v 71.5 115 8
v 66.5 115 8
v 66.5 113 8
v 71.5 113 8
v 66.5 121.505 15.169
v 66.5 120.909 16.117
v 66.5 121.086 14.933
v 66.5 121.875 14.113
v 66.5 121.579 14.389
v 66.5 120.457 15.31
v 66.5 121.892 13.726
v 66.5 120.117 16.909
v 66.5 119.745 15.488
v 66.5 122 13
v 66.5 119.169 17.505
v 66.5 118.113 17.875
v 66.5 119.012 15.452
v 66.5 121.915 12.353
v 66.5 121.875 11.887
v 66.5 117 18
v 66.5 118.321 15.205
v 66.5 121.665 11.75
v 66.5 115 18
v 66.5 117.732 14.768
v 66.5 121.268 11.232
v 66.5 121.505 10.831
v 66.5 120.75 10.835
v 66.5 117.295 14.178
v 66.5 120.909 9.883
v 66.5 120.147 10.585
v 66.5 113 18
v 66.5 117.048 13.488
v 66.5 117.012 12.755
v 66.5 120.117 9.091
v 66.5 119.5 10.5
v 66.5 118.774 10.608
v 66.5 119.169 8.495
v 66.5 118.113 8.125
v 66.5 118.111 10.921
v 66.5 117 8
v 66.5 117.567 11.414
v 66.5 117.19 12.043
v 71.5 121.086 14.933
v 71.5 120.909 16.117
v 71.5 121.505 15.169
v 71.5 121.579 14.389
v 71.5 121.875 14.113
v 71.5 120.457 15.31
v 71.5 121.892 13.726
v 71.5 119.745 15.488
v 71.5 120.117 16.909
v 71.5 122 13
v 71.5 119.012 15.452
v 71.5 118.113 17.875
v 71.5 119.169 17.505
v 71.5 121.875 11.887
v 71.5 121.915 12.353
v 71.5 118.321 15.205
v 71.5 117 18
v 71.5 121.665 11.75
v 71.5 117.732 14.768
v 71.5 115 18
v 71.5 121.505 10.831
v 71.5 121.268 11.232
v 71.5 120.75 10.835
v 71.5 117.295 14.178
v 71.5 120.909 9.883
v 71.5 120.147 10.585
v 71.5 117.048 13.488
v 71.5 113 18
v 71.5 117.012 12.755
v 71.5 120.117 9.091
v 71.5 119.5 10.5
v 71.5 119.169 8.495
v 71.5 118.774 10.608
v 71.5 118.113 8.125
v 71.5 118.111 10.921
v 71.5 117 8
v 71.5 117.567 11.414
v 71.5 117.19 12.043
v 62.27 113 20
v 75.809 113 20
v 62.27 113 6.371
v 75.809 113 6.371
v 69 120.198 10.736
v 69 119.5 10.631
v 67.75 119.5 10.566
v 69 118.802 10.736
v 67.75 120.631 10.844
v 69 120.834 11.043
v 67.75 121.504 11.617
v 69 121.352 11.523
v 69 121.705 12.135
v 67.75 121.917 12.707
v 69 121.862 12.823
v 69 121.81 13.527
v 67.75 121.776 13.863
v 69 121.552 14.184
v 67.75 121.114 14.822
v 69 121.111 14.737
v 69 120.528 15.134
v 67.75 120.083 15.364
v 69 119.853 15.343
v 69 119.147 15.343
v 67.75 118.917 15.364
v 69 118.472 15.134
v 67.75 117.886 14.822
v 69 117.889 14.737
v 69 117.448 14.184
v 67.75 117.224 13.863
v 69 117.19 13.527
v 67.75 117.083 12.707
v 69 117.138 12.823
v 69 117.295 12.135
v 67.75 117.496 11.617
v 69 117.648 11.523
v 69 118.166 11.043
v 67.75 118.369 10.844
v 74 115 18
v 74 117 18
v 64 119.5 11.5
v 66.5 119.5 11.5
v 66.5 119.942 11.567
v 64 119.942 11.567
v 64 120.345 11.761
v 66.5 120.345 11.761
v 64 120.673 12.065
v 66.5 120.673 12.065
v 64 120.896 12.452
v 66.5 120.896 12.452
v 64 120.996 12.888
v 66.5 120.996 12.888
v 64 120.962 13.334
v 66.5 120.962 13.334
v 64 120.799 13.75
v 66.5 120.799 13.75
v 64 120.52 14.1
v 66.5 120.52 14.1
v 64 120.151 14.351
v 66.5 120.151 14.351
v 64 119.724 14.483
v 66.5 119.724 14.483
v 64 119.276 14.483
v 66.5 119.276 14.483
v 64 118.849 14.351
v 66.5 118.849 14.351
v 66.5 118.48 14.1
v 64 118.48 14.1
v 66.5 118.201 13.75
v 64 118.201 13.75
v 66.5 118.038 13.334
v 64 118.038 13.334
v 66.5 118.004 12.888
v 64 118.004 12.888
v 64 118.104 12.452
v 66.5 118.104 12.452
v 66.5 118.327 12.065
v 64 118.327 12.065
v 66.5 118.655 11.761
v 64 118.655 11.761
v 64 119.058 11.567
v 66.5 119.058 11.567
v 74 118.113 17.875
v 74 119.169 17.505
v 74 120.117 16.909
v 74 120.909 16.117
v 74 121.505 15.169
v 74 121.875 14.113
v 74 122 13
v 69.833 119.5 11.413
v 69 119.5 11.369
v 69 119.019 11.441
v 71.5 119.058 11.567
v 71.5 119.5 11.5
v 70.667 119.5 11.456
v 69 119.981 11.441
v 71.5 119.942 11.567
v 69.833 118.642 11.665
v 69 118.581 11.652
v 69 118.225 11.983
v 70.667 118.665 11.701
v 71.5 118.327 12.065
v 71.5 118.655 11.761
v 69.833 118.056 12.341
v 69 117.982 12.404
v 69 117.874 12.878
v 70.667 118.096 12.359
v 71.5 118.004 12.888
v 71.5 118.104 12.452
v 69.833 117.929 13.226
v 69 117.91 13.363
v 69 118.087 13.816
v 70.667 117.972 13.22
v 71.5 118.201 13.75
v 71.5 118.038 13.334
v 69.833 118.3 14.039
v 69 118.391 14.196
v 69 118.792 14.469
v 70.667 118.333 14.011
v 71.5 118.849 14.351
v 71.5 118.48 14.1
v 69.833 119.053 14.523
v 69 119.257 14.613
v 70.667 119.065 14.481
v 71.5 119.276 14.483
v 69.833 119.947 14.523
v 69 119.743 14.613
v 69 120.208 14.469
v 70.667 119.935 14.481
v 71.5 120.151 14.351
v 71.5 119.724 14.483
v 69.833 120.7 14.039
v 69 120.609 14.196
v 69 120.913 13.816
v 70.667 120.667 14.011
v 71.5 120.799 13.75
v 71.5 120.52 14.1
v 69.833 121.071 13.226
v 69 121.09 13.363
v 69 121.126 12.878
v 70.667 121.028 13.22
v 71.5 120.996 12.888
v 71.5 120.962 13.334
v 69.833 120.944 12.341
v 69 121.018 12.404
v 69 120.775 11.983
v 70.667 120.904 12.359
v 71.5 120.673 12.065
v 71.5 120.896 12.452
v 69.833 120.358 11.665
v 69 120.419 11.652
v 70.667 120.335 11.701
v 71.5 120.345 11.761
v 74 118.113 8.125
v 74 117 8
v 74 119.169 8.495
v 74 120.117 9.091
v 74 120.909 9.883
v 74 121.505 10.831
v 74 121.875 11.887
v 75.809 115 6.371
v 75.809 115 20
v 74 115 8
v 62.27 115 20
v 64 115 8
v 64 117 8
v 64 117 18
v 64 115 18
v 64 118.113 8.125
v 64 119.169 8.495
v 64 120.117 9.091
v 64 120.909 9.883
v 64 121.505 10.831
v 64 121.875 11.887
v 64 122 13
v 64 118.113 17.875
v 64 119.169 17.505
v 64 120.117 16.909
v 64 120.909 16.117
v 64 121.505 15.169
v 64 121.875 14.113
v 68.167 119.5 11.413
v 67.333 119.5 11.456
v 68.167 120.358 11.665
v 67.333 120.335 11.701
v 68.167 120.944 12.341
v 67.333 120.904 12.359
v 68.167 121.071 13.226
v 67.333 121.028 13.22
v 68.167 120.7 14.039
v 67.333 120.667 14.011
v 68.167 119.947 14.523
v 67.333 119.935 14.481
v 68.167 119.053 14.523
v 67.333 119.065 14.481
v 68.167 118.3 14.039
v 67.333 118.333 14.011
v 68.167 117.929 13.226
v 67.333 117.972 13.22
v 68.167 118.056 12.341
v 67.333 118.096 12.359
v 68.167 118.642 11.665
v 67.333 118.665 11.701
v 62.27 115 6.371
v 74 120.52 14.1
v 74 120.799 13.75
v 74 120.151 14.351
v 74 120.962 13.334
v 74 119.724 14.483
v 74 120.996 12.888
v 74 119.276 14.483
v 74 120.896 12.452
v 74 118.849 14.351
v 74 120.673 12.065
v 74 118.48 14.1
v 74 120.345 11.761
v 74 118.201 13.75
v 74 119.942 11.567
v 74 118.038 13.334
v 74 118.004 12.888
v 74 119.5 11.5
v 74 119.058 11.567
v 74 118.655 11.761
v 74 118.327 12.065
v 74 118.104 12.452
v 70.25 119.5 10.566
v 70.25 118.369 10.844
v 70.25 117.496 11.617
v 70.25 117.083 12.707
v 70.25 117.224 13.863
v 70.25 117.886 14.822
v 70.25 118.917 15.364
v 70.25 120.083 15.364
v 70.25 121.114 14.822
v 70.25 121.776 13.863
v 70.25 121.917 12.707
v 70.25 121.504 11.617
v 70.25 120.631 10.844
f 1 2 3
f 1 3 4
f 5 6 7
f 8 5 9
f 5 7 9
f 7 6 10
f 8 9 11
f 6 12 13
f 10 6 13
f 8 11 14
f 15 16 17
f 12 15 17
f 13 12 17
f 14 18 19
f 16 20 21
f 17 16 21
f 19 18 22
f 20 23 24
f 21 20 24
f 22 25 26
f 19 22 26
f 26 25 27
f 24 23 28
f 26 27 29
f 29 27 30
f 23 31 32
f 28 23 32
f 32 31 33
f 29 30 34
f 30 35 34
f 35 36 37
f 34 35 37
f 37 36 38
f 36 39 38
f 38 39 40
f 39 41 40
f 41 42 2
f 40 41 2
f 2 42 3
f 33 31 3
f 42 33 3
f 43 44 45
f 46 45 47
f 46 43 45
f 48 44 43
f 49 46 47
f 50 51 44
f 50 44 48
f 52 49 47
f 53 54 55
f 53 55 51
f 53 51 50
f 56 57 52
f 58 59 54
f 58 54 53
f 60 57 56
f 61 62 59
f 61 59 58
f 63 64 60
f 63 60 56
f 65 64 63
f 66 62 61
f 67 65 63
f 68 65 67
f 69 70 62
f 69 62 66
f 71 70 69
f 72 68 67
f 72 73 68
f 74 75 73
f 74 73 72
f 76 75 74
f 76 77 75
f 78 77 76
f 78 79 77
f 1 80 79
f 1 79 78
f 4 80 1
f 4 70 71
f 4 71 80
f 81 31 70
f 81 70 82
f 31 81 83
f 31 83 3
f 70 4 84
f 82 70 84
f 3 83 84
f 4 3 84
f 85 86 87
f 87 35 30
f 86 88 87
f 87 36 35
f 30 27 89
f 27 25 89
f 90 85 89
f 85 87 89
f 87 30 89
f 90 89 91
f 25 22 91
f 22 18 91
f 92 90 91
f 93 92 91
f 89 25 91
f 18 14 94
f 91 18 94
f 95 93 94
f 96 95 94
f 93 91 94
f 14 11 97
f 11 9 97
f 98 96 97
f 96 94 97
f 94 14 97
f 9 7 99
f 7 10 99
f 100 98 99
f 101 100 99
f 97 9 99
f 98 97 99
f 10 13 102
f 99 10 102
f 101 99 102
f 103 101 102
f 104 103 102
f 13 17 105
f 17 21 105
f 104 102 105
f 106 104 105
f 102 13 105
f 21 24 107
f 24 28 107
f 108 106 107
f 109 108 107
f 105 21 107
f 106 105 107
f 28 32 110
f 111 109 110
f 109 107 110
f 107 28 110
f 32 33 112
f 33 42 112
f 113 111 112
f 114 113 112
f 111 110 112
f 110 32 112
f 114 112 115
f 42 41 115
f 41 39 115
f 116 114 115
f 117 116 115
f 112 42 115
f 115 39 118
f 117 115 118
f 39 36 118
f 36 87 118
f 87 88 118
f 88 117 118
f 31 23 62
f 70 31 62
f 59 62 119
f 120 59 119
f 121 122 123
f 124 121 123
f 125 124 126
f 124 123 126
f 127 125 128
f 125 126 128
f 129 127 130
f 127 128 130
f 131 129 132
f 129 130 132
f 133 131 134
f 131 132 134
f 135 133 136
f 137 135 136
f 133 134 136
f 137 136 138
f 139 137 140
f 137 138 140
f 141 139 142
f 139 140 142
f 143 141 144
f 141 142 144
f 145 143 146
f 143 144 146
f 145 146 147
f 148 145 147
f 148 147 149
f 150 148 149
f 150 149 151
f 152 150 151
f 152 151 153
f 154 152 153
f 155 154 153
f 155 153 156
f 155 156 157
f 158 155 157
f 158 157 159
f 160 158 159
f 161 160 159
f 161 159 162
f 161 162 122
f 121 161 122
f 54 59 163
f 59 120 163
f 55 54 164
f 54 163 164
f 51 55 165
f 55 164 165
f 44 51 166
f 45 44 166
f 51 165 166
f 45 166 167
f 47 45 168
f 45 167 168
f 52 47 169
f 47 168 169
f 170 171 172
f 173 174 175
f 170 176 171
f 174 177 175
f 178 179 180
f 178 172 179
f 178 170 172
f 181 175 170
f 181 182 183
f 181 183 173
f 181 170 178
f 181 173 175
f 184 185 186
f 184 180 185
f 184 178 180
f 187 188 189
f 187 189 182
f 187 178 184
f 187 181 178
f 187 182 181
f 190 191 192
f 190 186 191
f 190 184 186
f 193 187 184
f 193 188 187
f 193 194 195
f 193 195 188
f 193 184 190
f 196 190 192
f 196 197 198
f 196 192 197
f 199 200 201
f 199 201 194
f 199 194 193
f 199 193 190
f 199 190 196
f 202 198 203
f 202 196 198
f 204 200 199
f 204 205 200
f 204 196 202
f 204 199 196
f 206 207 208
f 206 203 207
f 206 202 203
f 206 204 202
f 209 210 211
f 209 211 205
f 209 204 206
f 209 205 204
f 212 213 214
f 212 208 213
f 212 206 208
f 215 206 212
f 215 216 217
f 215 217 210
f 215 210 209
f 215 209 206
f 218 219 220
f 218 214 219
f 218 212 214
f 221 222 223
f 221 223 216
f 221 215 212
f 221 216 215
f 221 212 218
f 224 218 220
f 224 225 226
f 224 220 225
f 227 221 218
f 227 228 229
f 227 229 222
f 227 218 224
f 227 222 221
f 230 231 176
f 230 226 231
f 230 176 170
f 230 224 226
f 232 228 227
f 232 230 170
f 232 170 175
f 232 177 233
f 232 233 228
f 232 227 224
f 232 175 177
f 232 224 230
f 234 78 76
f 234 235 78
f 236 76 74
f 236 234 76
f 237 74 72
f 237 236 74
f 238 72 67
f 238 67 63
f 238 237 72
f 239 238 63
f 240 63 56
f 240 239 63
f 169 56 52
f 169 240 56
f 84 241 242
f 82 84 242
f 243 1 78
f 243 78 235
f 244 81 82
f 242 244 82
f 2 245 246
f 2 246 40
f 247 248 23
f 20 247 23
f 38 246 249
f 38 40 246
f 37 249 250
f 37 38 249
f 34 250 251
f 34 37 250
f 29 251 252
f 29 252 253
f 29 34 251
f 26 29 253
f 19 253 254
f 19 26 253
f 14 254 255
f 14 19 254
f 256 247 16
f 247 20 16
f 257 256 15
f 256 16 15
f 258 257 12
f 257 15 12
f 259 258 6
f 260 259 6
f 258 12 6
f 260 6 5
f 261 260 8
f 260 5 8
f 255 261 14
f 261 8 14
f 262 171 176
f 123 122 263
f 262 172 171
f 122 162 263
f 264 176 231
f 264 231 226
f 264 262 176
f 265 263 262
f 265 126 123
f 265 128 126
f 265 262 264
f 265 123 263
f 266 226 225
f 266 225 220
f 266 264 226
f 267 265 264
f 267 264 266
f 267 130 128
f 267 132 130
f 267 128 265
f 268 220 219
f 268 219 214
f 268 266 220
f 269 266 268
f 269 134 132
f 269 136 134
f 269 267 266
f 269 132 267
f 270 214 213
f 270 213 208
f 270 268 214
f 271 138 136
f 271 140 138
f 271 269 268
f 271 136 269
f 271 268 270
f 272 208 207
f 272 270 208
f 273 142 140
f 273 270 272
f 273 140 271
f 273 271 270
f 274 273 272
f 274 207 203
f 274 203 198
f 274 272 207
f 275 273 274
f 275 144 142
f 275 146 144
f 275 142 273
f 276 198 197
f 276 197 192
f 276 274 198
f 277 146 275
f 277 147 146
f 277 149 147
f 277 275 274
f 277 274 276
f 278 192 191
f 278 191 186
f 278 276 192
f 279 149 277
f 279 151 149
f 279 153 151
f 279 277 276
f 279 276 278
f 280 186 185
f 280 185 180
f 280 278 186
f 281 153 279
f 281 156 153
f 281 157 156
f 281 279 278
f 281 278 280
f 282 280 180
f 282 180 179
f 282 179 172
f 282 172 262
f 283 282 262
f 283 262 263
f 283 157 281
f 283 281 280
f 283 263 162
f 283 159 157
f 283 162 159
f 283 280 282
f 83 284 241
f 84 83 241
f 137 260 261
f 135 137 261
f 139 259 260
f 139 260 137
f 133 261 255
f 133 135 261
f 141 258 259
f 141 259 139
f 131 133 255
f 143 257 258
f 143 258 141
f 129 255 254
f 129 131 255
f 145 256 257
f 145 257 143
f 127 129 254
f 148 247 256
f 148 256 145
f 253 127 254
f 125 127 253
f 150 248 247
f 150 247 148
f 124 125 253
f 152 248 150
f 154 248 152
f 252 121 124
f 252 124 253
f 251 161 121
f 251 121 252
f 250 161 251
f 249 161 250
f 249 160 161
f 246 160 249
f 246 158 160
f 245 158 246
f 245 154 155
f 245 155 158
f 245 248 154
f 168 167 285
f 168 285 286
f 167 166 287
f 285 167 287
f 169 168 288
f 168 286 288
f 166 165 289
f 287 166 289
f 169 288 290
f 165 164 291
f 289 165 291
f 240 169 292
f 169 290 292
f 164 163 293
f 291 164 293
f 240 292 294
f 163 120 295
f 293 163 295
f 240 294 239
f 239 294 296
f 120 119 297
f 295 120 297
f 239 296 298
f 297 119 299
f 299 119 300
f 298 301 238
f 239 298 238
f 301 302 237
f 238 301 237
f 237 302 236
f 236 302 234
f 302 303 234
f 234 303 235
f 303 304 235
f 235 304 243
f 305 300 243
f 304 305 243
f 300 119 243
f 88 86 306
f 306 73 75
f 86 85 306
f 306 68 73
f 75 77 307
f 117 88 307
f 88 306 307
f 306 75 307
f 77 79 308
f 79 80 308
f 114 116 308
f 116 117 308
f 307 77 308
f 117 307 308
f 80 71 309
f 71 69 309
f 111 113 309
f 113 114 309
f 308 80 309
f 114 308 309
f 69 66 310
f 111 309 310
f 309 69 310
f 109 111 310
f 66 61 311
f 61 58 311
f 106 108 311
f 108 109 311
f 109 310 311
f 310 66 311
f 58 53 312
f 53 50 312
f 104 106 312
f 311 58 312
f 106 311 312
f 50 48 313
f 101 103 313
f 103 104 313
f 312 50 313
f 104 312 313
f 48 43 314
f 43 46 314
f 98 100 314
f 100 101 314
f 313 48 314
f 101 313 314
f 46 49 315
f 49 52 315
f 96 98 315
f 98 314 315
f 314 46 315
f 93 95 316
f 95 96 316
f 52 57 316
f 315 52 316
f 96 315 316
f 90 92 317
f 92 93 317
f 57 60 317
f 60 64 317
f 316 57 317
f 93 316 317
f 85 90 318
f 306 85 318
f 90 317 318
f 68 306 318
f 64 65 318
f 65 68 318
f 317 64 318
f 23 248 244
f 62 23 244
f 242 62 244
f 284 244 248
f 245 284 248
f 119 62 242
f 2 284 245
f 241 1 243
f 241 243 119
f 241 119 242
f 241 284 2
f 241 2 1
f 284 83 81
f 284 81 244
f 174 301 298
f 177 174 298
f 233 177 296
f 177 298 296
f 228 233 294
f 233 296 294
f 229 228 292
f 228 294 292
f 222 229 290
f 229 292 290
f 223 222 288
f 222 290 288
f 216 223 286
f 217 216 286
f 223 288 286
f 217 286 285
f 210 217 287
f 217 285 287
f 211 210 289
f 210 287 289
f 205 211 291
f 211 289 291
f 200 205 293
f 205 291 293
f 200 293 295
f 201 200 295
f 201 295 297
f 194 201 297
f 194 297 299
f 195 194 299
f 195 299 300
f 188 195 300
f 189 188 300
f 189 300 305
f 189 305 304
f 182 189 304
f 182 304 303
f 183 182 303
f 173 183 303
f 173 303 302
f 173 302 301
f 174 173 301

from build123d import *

# Parameters (mm, degrees)
BOSS_EXTRUDE1_DEPTH       = 20
SKETCH2_W                 = 20
SKETCH2_H                 = 30
CUT_EXTRUDE1_DEPTH        = 142.509716981
SHELL1_T                  = -2
SHELL1_THICKNESS_2_FACE_W = 20
SHELL1_THICKNESS_2_FACE_H = 18
SHELL1_THICKNESS_2_DEPTH  = 3
SHELL1_THICKNESS_3_FACE_W = 18
SHELL1_THICKNESS_3_FACE_H = 20
SHELL1_THICKNESS_3_DEPTH  = 3
SKETCH42_W                = 1.26968537
SKETCH42_H                = 30
BOSS_EXTRUDE16_DEPTH      = 15
SKETCH45_W                = 2
SKETCH45_H                = 30
BOSS_EXTRUDE17_DEPTH      = 15
CUT_EXTRUDE15_DEPTH       = 1
CUT_EXTRUDE15_DEPTH_BACK  = 51
SKETCH40_R                = 1.25
SKETCH41_W                = 8
SKETCH41_H                = 20
CUT_EXTRUDE16_DEPTH       = 10
SKETCH44_W                = 1
SKETCH44_H                = 5
CUT_EXTRUDE18_DEPTH       = 18
BOSS_EXTRUDE18_DEPTH      = 15
CUT_EXTRUDE19_DEPTH       = 44.5
CUT_EXTRUDE19_DEPTH_BACK  = 1
SKETCH47_R                = 1.1
SKETCH50_W                = 25
SKETCH50_H                = 2
BOSS_EXTRUDE19_DEPTH      = 15
SKETCH51_W                = 10.975395667
SKETCH51_H                = 2
BOSS_EXTRUDE20_DEPTH      = 15
BOSS_EXTRUDE21_DEPTH      = 5
CUT_EXTRUDE21_DEPTH       = 33.5
CUT_EXTRUDE21_DEPTH_BACK  = 1
SKETCH53_R                = 1.1
CUT_EXTRUDE14_REACH       = 107
SKETCH34_R                = 2.5
SKETCH3_W                 = 2.5
SKETCH3_H                 = 10
BOSS_EXTRUDE2_DEPTH       = 7
FILLET2_R                 = 5
CUT_EXTRUDE3_REACH        = 151.466
SKETCH6_R                 = 1.5
SKETCH21_R                = 2.5
SKETCH21_R_2              = 1.5
BOSS_EXTRUDE10_DEPTH      = 2.5
BOSS_EXTRUDE10_DRAFT      = 3
MIRROR7_COPY_1_SKETCH_R   = 2.5
MIRROR7_COPY_1_SKETCH_R_2 = 1.5
MIRROR7_COPY_1_DEPTH      = 2.5
MIRROR7_COPY_1_DRAFT      = 3
SKETCH26_W                = 5
SKETCH26_H                = 10
CUT_EXTRUDE8_DEPTH        = 2
SKETCH7_W                 = 2.5
SKETCH7_H                 = 10
BOSS_EXTRUDE4_DEPTH       = 5
FILLET4_R                 = 5
SKETCH22_R                = 2.5
BOSS_EXTRUDE11_DEPTH      = 2.5
BOSS_EXTRUDE11_TAPER      = 3
SKETCH23_R                = 1.5
CUT_EXTRUDE7_DEPTH        = 10
CUT_EXTRUDE9_REACH        = 143.51
SKETCH27_W                = 5
SKETCH27_H                = 10
SKETCH10_W                = 2.5
SKETCH10_H                = 10
BOSS_EXTRUDE6_DEPTH       = 5
FILLET6_R                 = 5
SKETCH28_R                = 2.5
BOSS_EXTRUDE12_DEPTH      = 2.5
BOSS_EXTRUDE12_TAPER      = 3
SKETCH29_R                = 1.5
CUT_EXTRUDE10_DEPTH       = 10
CUT_EXTRUDE11_REACH       = 139.477
SKETCH30_W                = 5
SKETCH30_H                = 10
SKETCH13_W                = 2.5
SKETCH13_H                = 10
BOSS_EXTRUDE8_DEPTH       = 5
FILLET8_R                 = 5
SKETCH31_R                = 2.5
BOSS_EXTRUDE13_DEPTH      = 2.5
BOSS_EXTRUDE13_TAPER      = 3
SKETCH32_R                = 1.5
CUT_EXTRUDE12_DEPTH       = 10
SKETCH33_W                = 5
SKETCH33_H                = 10
CUT_EXTRUDE13_DEPTH       = 2
SKETCH55_W                = 107.992137911
SKETCH55_H                = 152.047916128
CUT_EXTRUDE22_DEPTH       = 148.254881074
SKETCH57_W                = 24.522556922
SKETCH57_H                = 115.444687751
CUT_EXTRUDE23_DEPTH       = 148.254881074
CUT_EXTRUDE24_DEPTH       = 83.758685345


with BuildPart() as part:
    # Sketch1 → Boss-Extrude1 (new body)
    with BuildSketch(Plane.XY):
        Polygon((58, 114), (58, 115), (80, 115), (80, 20), (60, 0), (0, 0), (-10, 25), (-10, 105), (11, 105), (11, 110), (12, 110), (34, 110), (34, 115), (35, 115), (57, 115), (57, 114), align=None)
    extrude(amount=BOSS_EXTRUDE1_DEPTH)

    # Sketch2 → Cut-Extrude1 (cut, through all)
    with BuildSketch(Plane.XY.offset(20)):
        with Locations((70, 45)):
            Rectangle(SKETCH2_W, SKETCH2_H)
    extrude(amount=-CUT_EXTRUDE1_DEPTH, mode=Mode.SUBTRACT)

    # Shell1
    shell1_openings = [part.faces().sort_by_distance(p)[0] for p in [
        (33.373630802, 58.203978459, 20),
    ]]
    offset(amount=SHELL1_T, openings=shell1_openings, kind=Kind.INTERSECTION)

    # Shell1 thickness 2 face (on inner face of the shell) → Shell1 thickness 2 (add)
    with BuildSketch(Plane(origin=(68, 28, 11), x_dir=(1, 0, 0), z_dir=(0, 1, 0))):
        Rectangle(SHELL1_THICKNESS_2_FACE_W, SHELL1_THICKNESS_2_FACE_H)
    extrude(amount=-SHELL1_THICKNESS_2_DEPTH)

    # Shell1 thickness 3 face (on inner face of the shell) → Shell1 thickness 3 (add)
    with BuildSketch(Plane(origin=(68, 62, 11), x_dir=(0, 0, -1), z_dir=(0, -1, 0))):
        Rectangle(SHELL1_THICKNESS_3_FACE_W, SHELL1_THICKNESS_3_FACE_H)
    extrude(amount=-SHELL1_THICKNESS_3_DEPTH)

    # Sketch42 → Boss-Extrude16 (add)
    with BuildSketch(Plane.XY.offset(2)):
        with Locations((55.634842685, 97)):
            Rectangle(SKETCH42_W, SKETCH42_H)
    extrude(amount=BOSS_EXTRUDE16_DEPTH)

    # Sketch45 → Boss-Extrude17 (add)
    with BuildSketch(Plane.XY.offset(2)):
        with Locations((31.497271128, 93)):
            Rectangle(SKETCH45_W, SKETCH45_H)
    extrude(amount=BOSS_EXTRUDE17_DEPTH)

    # Sketch40 → Cut-Extrude15 (cut, two sides: drawn at the far end of the back side and taken through both)
    with BuildSketch(Plane(origin=(78, 0, 0), x_dir=(0, 0, -1), z_dir=(1, 0, 0)).offset(-CUT_EXTRUDE15_DEPTH_BACK)):
        with Locations(Location((-13.5, 105, 0), (0, 0, 90))):
            Circle(SKETCH40_R)
    extrude(amount=CUT_EXTRUDE15_DEPTH + CUT_EXTRUDE15_DEPTH_BACK, mode=Mode.SUBTRACT)

    # Sketch41 → Cut-Extrude16 (cut)
    with BuildSketch(Plane.ZY.offset(-58)):
        with Locations((11, 45)):
            Rectangle(SKETCH41_W, SKETCH41_H)
    extrude(amount=-CUT_EXTRUDE16_DEPTH, mode=Mode.SUBTRACT)

    # Sketch44 → Cut-Extrude18 (cut)
    with BuildSketch(Plane.XY.offset(20)):
        with Locations((35.5, 110.5)):
            Rectangle(SKETCH44_W, SKETCH44_H)
    extrude(amount=-CUT_EXTRUDE18_DEPTH, mode=Mode.SUBTRACT)

    # Sketch46 → Boss-Extrude18 (add)
    with BuildSketch(Plane.XY.offset(2)):
        Polygon((12.078813568, 88), (12.078813568, 89), (16.75, 89), (16.75, 79), (15.75, 79), (15.75, 88), align=None)
    extrude(amount=BOSS_EXTRUDE18_DEPTH)

    # Sketch47 → Cut-Extrude19 (cut, two sides: drawn at the far end of the back side and taken through both)
    with BuildSketch(Plane(origin=(-8, 0, 0), x_dir=(0, 0, -1), z_dir=(1, 0, 0)).offset(-CUT_EXTRUDE19_DEPTH_BACK)):
        with Locations(Location((-13.5, 95, 0), (0, 0, 270))):
            Circle(SKETCH47_R)
    extrude(amount=CUT_EXTRUDE19_DEPTH + CUT_EXTRUDE19_DEPTH_BACK, mode=Mode.SUBTRACT)

    # Sketch50 → Boss-Extrude19 (add)
    with BuildSketch(Plane.XY.offset(2)):
        with Locations((45.5, 58.4)):
            Rectangle(SKETCH50_W, SKETCH50_H)
    extrude(amount=BOSS_EXTRUDE19_DEPTH)

    # Sketch51 → Boss-Extrude20 (add)
    with BuildSketch(Plane.XY.offset(2)):
        with Locations((52.512302167, 34)):
            Rectangle(SKETCH51_W, SKETCH51_H)
    extrude(amount=BOSS_EXTRUDE20_DEPTH)

    # Sketch52 → Boss-Extrude21 (add)
    with BuildSketch(Plane.XY.offset(2)):
        Polygon((42.748392928, 49.4), (43.748392928, 49.4), (43.748392928, 44.4), (33.748392928, 44.4), (33.748392928, 45.4), (42.748392928, 45.4), align=None)
        Polygon((40.497271128, 97.212593004), (40.497271128, 98.212593004), (45.497271128, 98.212593004), (45.497271128, 88.212593004), (44.497271128, 88.226881517), (44.497271128, 97.212593004), align=None)
        Polygon((64.269685369, 97.226881517), (64.269685369, 98.226881517), (69.269685369, 98.226881517), (69.269685369, 88.226881517), (68.269685369, 88.226881517), (68.269685369, 97.226881517), align=None)
    extrude(amount=BOSS_EXTRUDE21_DEPTH)

    # Sketch53 → Cut-Extrude21 (cut, two sides: drawn at the far end of the back side and taken through both)
    with BuildSketch(Plane.XZ.offset(-57.4).offset(-CUT_EXTRUDE21_DEPTH_BACK)):
        with Locations(Location((49, 13.5, 0), (0, 0, 270))):
            Circle(SKETCH53_R)
    extrude(amount=CUT_EXTRUDE21_DEPTH + CUT_EXTRUDE21_DEPTH_BACK, mode=Mode.SUBTRACT)

    # Cut-Extrude14: up to this face of the body (flat: up to its plane)
    cut_extrude14_end = Plane(part.part.faces().sort_by_distance((68, 25, 11))[0])
    # Sketch34 → Cut-Extrude14 (cut, up to the picked face)
    with BuildSketch(Plane(origin=(0, 65, 0), x_dir=(1, 0, 0), z_dir=(0, 1, 0)), mode=Mode.PRIVATE) as cut_extrude14_sk1:
        with Locations(Location((70, -11, 0), (0, 0, 270))):
            Circle(SKETCH34_R)
    cut_extrude14_tool1 = split(extrude(cut_extrude14_sk1.sketch, amount=-CUT_EXTRUDE14_REACH, mode=Mode.PRIVATE), bisect_by=cut_extrude14_end, keep=Keep.BOTH, mode=Mode.PRIVATE)
    add(cut_extrude14_tool1.solids().sort_by(Axis((70, 65, 11), (0, -1, 0)))[0], mode=Mode.SUBTRACT)

    # Sketch3 → Boss-Extrude2 (add)
    with BuildSketch(Plane(origin=(0, 115, 0), x_dir=(1, 0, 0), z_dir=(0, 1, 0))):
        with Locations((65.25, -13)):
            Rectangle(SKETCH3_W, SKETCH3_H)
        with Locations((72.75, -13)):
            Rectangle(SKETCH3_W, SKETCH3_H)
    extrude(amount=BOSS_EXTRUDE2_DEPTH)

    # Fillet2
    fillet2_edges = [part.edges().sort_by_distance(p)[0] for p in [
        (65.25, 122, 8),
        (65.25, 122, 18),
        (72.75, 122, 8),
        (72.75, 122, 18),
    ]]
    fillet(fillet2_edges, radius=FILLET2_R - 0.0001)  # a hair under: the kernel refuses the full size

    # Cut-Extrude3: up to this face of the body (flat: up to its plane)
    cut_extrude3_end = Plane(part.part.faces().sort_by_distance((64, 118.068574318, 13))[0])
    # Sketch6 → Cut-Extrude3 (cut, up to the picked face)
    with BuildSketch(Plane(origin=(74, 0, 0), x_dir=(0, 0, -1), z_dir=(1, 0, 0)), mode=Mode.PRIVATE) as cut_extrude3_sk1:
        with Locations((-13, 119.5)):
            Circle(SKETCH6_R)
    cut_extrude3_tool1 = split(extrude(cut_extrude3_sk1.sketch, amount=-CUT_EXTRUDE3_REACH, mode=Mode.PRIVATE), bisect_by=cut_extrude3_end, keep=Keep.BOTH, mode=Mode.PRIVATE)
    add(cut_extrude3_tool1.solids().sort_by(Axis((74, 119.5, 13), (-1, 0, 0)))[0], mode=Mode.SUBTRACT)


with BuildPart() as boss_extrude10_tool:
    # Sketch21 → Boss-Extrude10 (with draft: the straight prism first)
    with BuildSketch(Plane(origin=(66.5, 0, 0), x_dir=(0, 0, -1), z_dir=(1, 0, 0))):
        with Locations((-13, 119.5)):
            Circle(SKETCH21_R)
        with Locations((-13, 119.5)):
            Circle(SKETCH21_R_2, mode=Mode.SUBTRACT)
    extrude(amount=BOSS_EXTRUDE10_DEPTH)
    # Boss-Extrude10: the draft: its side faces are tilted about the plane it starts from
    boss_extrude10_sides = [boss_extrude10_tool.faces().sort_by_distance(p)[0] for p in [
        (67.75, 119.5, 15.5),
        (67.75, 119.5, 14.5),
    ]]
    draft(boss_extrude10_sides, Plane(origin=(66.5, 0, 0), x_dir=(0, 0, -1), z_dir=(1, 0, 0)), BOSS_EXTRUDE10_DRAFT)


with BuildPart() as part_1:
    add(part.part)

    # Boss-Extrude10: add boss_extrude10_tool
    add(boss_extrude10_tool.part)


with BuildPart() as mirror7_copy_1_tool:
    # Mirror7 copy 1 sketch → Mirror7 copy 1 (with draft: the straight prism first)
    with BuildSketch(Plane(origin=(71.5, 0, 0), x_dir=(0, 0, -1), z_dir=(-1, 0, 0))):
        with Locations((-13, -119.5)):
            Circle(MIRROR7_COPY_1_SKETCH_R)
        with Locations((-13, -119.5)):
            Circle(MIRROR7_COPY_1_SKETCH_R_2, mode=Mode.SUBTRACT)
    extrude(amount=MIRROR7_COPY_1_DEPTH)
    # Mirror7 copy 1: the draft: its side faces are tilted about the plane it starts from
    mirror7_copy_1_sides = [mirror7_copy_1_tool.faces().sort_by_distance(p)[0] for p in [
        (70.25, 119.5, 15.5),
        (70.25, 119.5, 14.5),
    ]]
    draft(mirror7_copy_1_sides, Plane(origin=(71.5, 0, 0), x_dir=(0, 0, -1), z_dir=(-1, 0, 0)), MIRROR7_COPY_1_DRAFT)


with BuildPart() as part_2:
    add(part_1.part)

    # Mirror7 copy 1: add mirror7_copy_1_tool
    add(mirror7_copy_1_tool.part)

    # Sketch26 → Cut-Extrude8 (cut)
    with BuildSketch(Plane(origin=(0, 115, 0), x_dir=(1, 0, 0), z_dir=(0, 1, 0))):
        with Locations((69, -13)):
            Rectangle(SKETCH26_W, SKETCH26_H)
    extrude(amount=-CUT_EXTRUDE8_DEPTH, mode=Mode.SUBTRACT)

    # Sketch7 → Boss-Extrude4 (add)
    with BuildSketch(Plane(origin=(0, 115, 0), x_dir=(1, 0, 0), z_dir=(0, 1, 0))):
        with Locations((41.25, -13)):
            Rectangle(SKETCH7_W, SKETCH7_H)
        with Locations((48.75, -13)):
            Rectangle(SKETCH7_W, SKETCH7_H)
    extrude(amount=BOSS_EXTRUDE4_DEPTH)

    # Fillet4
    fillet4_edges = [part_2.edges().sort_by_distance(p)[0] for p in [
        (41.25, 120, 8),
        (41.25, 120, 18),
        (48.75, 120, 8),
        (48.75, 120, 18),
    ]]
    fillet(fillet4_edges, radius=FILLET4_R - 0.0001)  # a hair under: the kernel refuses the full size

    # Sketch22 → Boss-Extrude11 (add)
    with BuildSketch(Plane(origin=(42.5, 0, 0), x_dir=(0, 0, -1), z_dir=(1, 0, 0))):
        with Locations((-13, 117.5)):
            Circle(SKETCH22_R)
    boss_extrude11 = extrude(amount=BOSS_EXTRUDE11_DEPTH, taper=BOSS_EXTRUDE11_TAPER)

    # Mirror8: Boss-Extrude11 across plane
    add(boss_extrude11.mirror(Plane(origin=(45, 117.5, 13), x_dir=(0, 0, 1), z_dir=(1, 0, 0))))

    # Sketch23 → Cut-Extrude7 (cut)
    with BuildSketch(Plane(origin=(50, 0, 0), x_dir=(0, 0, -1), z_dir=(1, 0, 0))):
        with Locations(Location((-13, 117.5, 0), (0, 0, 90))):
            Circle(SKETCH23_R)
    extrude(amount=-CUT_EXTRUDE7_DEPTH, mode=Mode.SUBTRACT)

    # Sketch27 → Cut-Extrude9 (cut, up to next)
    with BuildSketch(Plane(origin=(0, 115, 0), x_dir=(1, 0, 0), z_dir=(0, 1, 0)), mode=Mode.PRIVATE) as cut_extrude9_sk1:
        with Locations((45, -13)):
            Rectangle(SKETCH27_W, SKETCH27_H)
    cut_extrude9_tool1 = extrude(cut_extrude9_sk1.sketch, amount=-CUT_EXTRUDE9_REACH, mode=Mode.PRIVATE) & part_2.part
    add(cut_extrude9_tool1.solids().sort_by_distance((45, 115, 13))[0], mode=Mode.SUBTRACT)

    # Sketch10 → Boss-Extrude6 (add)
    with BuildSketch(Plane(origin=(0, 110, 0), x_dir=(1, 0, 0), z_dir=(0, 1, 0))):
        with Locations((19.25, -13)):
            Rectangle(SKETCH10_W, SKETCH10_H)
        with Locations((26.75, -13)):
            Rectangle(SKETCH10_W, SKETCH10_H)
    extrude(amount=BOSS_EXTRUDE6_DEPTH)

    # Fillet6
    fillet6_edges = [part_2.edges().sort_by_distance(p)[0] for p in [
        (19.25, 115, 18),
        (19.25, 115, 8),
        (26.75, 115, 8),
        (26.75, 115, 18),
    ]]
    fillet(fillet6_edges, radius=FILLET6_R - 0.0001)  # a hair under: the kernel refuses the full size

    # Sketch28 → Boss-Extrude12 (add)
    with BuildSketch(Plane(origin=(20.5, 0, 0), x_dir=(0, 0, -1), z_dir=(1, 0, 0))):
        with Locations((-13, 112.5)):
            Circle(SKETCH28_R)
    boss_extrude12 = extrude(amount=BOSS_EXTRUDE12_DEPTH, taper=BOSS_EXTRUDE12_TAPER)

    # Mirror9: Boss-Extrude12 across plane
    add(boss_extrude12.mirror(Plane(origin=(23, 112.5, 13), x_dir=(0, 0, 1), z_dir=(1, 0, 0))))

    # Sketch29 → Cut-Extrude10 (cut)
    with BuildSketch(Plane(origin=(28, 0, 0), x_dir=(0, 0, -1), z_dir=(1, 0, 0))):
        with Locations((-13, 112.5)):
            Circle(SKETCH29_R)
    extrude(amount=-CUT_EXTRUDE10_DEPTH, mode=Mode.SUBTRACT)

    # Sketch30 → Cut-Extrude11 (cut, up to next)
    with BuildSketch(Plane(origin=(0, 110, 0), x_dir=(1, 0, 0), z_dir=(0, 1, 0)), mode=Mode.PRIVATE) as cut_extrude11_sk1:
        with Locations((23, -13)):
            Rectangle(SKETCH30_W, SKETCH30_H)
    cut_extrude11_tool1 = extrude(cut_extrude11_sk1.sketch, amount=-CUT_EXTRUDE11_REACH, mode=Mode.PRIVATE) & part_2.part
    add(cut_extrude11_tool1.solids().sort_by_distance((23, 110, 13))[0], mode=Mode.SUBTRACT)

    # Sketch13 → Boss-Extrude8 (add)
    with BuildSketch(Plane(origin=(0, 105, 0), x_dir=(1, 0, 0), z_dir=(0, 1, 0))):
        with Locations((-2.75, -13)):
            Rectangle(SKETCH13_W, SKETCH13_H)
        with Locations((4.75, -13)):
            Rectangle(SKETCH13_W, SKETCH13_H)
    extrude(amount=BOSS_EXTRUDE8_DEPTH)

    # Fillet8
    fillet8_edges = [part_2.edges().sort_by_distance(p)[0] for p in [
        (-2.75, 110, 18),
        (-2.75, 110, 8),
        (4.75, 110, 8),
        (4.75, 110, 18),
    ]]
    fillet(fillet8_edges, radius=FILLET8_R - 0.0001)  # a hair under: the kernel refuses the full size

    # Sketch31 → Boss-Extrude13 (add)
    with BuildSketch(Plane(origin=(-1.5, 0, 0), x_dir=(0, 0, -1), z_dir=(1, 0, 0))):
        with Locations((-13, 107.5)):
            Circle(SKETCH31_R)
    boss_extrude13 = extrude(amount=BOSS_EXTRUDE13_DEPTH, taper=BOSS_EXTRUDE13_TAPER)

    # Mirror10: Boss-Extrude13 across plane
    add(boss_extrude13.mirror(Plane(origin=(1, 107.5, 13), x_dir=(0, 0, 1), z_dir=(1, 0, 0))))

    # Sketch32 → Cut-Extrude12 (cut)
    with BuildSketch(Plane(origin=(6, 0, 0), x_dir=(0, 0, -1), z_dir=(1, 0, 0))):
        with Locations((-13, 107.5)):
            Circle(SKETCH32_R)
    extrude(amount=-CUT_EXTRUDE12_DEPTH, mode=Mode.SUBTRACT)

    # Sketch33 → Cut-Extrude13 (cut)
    with BuildSketch(Plane(origin=(0, 105, 0), x_dir=(1, 0, 0), z_dir=(0, 1, 0))):
        with Locations((1, -13)):
            Rectangle(SKETCH33_W, SKETCH33_H)
    extrude(amount=-CUT_EXTRUDE13_DEPTH, mode=Mode.SUBTRACT)

    # Sketch55 → Cut-Extrude22 (cut, through all)
    with BuildSketch(Plane(origin=(0, 0, 0), x_dir=(-1, 0, 0), z_dir=(0, 0, -1))):
        with Locations((-8.273574449, 59.296747854)):
            Rectangle(SKETCH55_W, SKETCH55_H)
    extrude(amount=-CUT_EXTRUDE22_DEPTH, mode=Mode.SUBTRACT)


with BuildPart() as cut_extrude22_piece_1:
    # of the separate pieces the step leaves, piece 1, a body of its own (cut_extrude22_pieces)
    add(part_2.part.solids().sort_by_distance((62.269643405, 60, 0))[0])


with BuildPart() as cut_extrude22_piece_2:
    # of the separate pieces the step leaves, piece 2, a body of its own (cut_extrude22_pieces)
    add(part_2.part.solids().sort_by_distance((62.269643405, 2.269643405, 0))[0])


with BuildPart() as cut_extrude23_tool:
    # Sketch57 → Cut-Extrude23 (new, through all)
    with BuildSketch(Plane(origin=(0, 0, 0), x_dir=(-1, 0, 0), z_dir=(0, 0, -1))):
        with Locations((-74.530921866, 55.277656124)):
            Rectangle(SKETCH57_W, SKETCH57_H)
    extrude(amount=-CUT_EXTRUDE23_DEPTH)


with BuildPart() as cut_extrude22_piece_1_1:
    add(cut_extrude22_piece_1.part)

    # Cut-Extrude23: cut by cut_extrude23_tool
    add(cut_extrude23_tool.part, mode=Mode.SUBTRACT)

    # Sketch58 → Cut-Extrude24 (cut, through all)
    with BuildSketch(Plane(origin=(0, 115, 0), x_dir=(1, 0, 0), z_dir=(0, 1, 0))):
        Polygon((80, 0), (62.269643405, 0), (62.269643405, -6.370932132), (75.808765206, -6.370932132), (75.808765206, -20), (80, -20), (80, -6.370932132), align=None)
    extrude(amount=-CUT_EXTRUDE24_DEPTH, mode=Mode.SUBTRACT)


with BuildPart() as cut_extrude22_piece_2_1:
    add(cut_extrude22_piece_2.part)

    # Cut-Extrude23: cut by cut_extrude23_tool
    add(cut_extrude23_tool.part, mode=Mode.SUBTRACT)


solid = cut_extrude22_piece_1_1.part
